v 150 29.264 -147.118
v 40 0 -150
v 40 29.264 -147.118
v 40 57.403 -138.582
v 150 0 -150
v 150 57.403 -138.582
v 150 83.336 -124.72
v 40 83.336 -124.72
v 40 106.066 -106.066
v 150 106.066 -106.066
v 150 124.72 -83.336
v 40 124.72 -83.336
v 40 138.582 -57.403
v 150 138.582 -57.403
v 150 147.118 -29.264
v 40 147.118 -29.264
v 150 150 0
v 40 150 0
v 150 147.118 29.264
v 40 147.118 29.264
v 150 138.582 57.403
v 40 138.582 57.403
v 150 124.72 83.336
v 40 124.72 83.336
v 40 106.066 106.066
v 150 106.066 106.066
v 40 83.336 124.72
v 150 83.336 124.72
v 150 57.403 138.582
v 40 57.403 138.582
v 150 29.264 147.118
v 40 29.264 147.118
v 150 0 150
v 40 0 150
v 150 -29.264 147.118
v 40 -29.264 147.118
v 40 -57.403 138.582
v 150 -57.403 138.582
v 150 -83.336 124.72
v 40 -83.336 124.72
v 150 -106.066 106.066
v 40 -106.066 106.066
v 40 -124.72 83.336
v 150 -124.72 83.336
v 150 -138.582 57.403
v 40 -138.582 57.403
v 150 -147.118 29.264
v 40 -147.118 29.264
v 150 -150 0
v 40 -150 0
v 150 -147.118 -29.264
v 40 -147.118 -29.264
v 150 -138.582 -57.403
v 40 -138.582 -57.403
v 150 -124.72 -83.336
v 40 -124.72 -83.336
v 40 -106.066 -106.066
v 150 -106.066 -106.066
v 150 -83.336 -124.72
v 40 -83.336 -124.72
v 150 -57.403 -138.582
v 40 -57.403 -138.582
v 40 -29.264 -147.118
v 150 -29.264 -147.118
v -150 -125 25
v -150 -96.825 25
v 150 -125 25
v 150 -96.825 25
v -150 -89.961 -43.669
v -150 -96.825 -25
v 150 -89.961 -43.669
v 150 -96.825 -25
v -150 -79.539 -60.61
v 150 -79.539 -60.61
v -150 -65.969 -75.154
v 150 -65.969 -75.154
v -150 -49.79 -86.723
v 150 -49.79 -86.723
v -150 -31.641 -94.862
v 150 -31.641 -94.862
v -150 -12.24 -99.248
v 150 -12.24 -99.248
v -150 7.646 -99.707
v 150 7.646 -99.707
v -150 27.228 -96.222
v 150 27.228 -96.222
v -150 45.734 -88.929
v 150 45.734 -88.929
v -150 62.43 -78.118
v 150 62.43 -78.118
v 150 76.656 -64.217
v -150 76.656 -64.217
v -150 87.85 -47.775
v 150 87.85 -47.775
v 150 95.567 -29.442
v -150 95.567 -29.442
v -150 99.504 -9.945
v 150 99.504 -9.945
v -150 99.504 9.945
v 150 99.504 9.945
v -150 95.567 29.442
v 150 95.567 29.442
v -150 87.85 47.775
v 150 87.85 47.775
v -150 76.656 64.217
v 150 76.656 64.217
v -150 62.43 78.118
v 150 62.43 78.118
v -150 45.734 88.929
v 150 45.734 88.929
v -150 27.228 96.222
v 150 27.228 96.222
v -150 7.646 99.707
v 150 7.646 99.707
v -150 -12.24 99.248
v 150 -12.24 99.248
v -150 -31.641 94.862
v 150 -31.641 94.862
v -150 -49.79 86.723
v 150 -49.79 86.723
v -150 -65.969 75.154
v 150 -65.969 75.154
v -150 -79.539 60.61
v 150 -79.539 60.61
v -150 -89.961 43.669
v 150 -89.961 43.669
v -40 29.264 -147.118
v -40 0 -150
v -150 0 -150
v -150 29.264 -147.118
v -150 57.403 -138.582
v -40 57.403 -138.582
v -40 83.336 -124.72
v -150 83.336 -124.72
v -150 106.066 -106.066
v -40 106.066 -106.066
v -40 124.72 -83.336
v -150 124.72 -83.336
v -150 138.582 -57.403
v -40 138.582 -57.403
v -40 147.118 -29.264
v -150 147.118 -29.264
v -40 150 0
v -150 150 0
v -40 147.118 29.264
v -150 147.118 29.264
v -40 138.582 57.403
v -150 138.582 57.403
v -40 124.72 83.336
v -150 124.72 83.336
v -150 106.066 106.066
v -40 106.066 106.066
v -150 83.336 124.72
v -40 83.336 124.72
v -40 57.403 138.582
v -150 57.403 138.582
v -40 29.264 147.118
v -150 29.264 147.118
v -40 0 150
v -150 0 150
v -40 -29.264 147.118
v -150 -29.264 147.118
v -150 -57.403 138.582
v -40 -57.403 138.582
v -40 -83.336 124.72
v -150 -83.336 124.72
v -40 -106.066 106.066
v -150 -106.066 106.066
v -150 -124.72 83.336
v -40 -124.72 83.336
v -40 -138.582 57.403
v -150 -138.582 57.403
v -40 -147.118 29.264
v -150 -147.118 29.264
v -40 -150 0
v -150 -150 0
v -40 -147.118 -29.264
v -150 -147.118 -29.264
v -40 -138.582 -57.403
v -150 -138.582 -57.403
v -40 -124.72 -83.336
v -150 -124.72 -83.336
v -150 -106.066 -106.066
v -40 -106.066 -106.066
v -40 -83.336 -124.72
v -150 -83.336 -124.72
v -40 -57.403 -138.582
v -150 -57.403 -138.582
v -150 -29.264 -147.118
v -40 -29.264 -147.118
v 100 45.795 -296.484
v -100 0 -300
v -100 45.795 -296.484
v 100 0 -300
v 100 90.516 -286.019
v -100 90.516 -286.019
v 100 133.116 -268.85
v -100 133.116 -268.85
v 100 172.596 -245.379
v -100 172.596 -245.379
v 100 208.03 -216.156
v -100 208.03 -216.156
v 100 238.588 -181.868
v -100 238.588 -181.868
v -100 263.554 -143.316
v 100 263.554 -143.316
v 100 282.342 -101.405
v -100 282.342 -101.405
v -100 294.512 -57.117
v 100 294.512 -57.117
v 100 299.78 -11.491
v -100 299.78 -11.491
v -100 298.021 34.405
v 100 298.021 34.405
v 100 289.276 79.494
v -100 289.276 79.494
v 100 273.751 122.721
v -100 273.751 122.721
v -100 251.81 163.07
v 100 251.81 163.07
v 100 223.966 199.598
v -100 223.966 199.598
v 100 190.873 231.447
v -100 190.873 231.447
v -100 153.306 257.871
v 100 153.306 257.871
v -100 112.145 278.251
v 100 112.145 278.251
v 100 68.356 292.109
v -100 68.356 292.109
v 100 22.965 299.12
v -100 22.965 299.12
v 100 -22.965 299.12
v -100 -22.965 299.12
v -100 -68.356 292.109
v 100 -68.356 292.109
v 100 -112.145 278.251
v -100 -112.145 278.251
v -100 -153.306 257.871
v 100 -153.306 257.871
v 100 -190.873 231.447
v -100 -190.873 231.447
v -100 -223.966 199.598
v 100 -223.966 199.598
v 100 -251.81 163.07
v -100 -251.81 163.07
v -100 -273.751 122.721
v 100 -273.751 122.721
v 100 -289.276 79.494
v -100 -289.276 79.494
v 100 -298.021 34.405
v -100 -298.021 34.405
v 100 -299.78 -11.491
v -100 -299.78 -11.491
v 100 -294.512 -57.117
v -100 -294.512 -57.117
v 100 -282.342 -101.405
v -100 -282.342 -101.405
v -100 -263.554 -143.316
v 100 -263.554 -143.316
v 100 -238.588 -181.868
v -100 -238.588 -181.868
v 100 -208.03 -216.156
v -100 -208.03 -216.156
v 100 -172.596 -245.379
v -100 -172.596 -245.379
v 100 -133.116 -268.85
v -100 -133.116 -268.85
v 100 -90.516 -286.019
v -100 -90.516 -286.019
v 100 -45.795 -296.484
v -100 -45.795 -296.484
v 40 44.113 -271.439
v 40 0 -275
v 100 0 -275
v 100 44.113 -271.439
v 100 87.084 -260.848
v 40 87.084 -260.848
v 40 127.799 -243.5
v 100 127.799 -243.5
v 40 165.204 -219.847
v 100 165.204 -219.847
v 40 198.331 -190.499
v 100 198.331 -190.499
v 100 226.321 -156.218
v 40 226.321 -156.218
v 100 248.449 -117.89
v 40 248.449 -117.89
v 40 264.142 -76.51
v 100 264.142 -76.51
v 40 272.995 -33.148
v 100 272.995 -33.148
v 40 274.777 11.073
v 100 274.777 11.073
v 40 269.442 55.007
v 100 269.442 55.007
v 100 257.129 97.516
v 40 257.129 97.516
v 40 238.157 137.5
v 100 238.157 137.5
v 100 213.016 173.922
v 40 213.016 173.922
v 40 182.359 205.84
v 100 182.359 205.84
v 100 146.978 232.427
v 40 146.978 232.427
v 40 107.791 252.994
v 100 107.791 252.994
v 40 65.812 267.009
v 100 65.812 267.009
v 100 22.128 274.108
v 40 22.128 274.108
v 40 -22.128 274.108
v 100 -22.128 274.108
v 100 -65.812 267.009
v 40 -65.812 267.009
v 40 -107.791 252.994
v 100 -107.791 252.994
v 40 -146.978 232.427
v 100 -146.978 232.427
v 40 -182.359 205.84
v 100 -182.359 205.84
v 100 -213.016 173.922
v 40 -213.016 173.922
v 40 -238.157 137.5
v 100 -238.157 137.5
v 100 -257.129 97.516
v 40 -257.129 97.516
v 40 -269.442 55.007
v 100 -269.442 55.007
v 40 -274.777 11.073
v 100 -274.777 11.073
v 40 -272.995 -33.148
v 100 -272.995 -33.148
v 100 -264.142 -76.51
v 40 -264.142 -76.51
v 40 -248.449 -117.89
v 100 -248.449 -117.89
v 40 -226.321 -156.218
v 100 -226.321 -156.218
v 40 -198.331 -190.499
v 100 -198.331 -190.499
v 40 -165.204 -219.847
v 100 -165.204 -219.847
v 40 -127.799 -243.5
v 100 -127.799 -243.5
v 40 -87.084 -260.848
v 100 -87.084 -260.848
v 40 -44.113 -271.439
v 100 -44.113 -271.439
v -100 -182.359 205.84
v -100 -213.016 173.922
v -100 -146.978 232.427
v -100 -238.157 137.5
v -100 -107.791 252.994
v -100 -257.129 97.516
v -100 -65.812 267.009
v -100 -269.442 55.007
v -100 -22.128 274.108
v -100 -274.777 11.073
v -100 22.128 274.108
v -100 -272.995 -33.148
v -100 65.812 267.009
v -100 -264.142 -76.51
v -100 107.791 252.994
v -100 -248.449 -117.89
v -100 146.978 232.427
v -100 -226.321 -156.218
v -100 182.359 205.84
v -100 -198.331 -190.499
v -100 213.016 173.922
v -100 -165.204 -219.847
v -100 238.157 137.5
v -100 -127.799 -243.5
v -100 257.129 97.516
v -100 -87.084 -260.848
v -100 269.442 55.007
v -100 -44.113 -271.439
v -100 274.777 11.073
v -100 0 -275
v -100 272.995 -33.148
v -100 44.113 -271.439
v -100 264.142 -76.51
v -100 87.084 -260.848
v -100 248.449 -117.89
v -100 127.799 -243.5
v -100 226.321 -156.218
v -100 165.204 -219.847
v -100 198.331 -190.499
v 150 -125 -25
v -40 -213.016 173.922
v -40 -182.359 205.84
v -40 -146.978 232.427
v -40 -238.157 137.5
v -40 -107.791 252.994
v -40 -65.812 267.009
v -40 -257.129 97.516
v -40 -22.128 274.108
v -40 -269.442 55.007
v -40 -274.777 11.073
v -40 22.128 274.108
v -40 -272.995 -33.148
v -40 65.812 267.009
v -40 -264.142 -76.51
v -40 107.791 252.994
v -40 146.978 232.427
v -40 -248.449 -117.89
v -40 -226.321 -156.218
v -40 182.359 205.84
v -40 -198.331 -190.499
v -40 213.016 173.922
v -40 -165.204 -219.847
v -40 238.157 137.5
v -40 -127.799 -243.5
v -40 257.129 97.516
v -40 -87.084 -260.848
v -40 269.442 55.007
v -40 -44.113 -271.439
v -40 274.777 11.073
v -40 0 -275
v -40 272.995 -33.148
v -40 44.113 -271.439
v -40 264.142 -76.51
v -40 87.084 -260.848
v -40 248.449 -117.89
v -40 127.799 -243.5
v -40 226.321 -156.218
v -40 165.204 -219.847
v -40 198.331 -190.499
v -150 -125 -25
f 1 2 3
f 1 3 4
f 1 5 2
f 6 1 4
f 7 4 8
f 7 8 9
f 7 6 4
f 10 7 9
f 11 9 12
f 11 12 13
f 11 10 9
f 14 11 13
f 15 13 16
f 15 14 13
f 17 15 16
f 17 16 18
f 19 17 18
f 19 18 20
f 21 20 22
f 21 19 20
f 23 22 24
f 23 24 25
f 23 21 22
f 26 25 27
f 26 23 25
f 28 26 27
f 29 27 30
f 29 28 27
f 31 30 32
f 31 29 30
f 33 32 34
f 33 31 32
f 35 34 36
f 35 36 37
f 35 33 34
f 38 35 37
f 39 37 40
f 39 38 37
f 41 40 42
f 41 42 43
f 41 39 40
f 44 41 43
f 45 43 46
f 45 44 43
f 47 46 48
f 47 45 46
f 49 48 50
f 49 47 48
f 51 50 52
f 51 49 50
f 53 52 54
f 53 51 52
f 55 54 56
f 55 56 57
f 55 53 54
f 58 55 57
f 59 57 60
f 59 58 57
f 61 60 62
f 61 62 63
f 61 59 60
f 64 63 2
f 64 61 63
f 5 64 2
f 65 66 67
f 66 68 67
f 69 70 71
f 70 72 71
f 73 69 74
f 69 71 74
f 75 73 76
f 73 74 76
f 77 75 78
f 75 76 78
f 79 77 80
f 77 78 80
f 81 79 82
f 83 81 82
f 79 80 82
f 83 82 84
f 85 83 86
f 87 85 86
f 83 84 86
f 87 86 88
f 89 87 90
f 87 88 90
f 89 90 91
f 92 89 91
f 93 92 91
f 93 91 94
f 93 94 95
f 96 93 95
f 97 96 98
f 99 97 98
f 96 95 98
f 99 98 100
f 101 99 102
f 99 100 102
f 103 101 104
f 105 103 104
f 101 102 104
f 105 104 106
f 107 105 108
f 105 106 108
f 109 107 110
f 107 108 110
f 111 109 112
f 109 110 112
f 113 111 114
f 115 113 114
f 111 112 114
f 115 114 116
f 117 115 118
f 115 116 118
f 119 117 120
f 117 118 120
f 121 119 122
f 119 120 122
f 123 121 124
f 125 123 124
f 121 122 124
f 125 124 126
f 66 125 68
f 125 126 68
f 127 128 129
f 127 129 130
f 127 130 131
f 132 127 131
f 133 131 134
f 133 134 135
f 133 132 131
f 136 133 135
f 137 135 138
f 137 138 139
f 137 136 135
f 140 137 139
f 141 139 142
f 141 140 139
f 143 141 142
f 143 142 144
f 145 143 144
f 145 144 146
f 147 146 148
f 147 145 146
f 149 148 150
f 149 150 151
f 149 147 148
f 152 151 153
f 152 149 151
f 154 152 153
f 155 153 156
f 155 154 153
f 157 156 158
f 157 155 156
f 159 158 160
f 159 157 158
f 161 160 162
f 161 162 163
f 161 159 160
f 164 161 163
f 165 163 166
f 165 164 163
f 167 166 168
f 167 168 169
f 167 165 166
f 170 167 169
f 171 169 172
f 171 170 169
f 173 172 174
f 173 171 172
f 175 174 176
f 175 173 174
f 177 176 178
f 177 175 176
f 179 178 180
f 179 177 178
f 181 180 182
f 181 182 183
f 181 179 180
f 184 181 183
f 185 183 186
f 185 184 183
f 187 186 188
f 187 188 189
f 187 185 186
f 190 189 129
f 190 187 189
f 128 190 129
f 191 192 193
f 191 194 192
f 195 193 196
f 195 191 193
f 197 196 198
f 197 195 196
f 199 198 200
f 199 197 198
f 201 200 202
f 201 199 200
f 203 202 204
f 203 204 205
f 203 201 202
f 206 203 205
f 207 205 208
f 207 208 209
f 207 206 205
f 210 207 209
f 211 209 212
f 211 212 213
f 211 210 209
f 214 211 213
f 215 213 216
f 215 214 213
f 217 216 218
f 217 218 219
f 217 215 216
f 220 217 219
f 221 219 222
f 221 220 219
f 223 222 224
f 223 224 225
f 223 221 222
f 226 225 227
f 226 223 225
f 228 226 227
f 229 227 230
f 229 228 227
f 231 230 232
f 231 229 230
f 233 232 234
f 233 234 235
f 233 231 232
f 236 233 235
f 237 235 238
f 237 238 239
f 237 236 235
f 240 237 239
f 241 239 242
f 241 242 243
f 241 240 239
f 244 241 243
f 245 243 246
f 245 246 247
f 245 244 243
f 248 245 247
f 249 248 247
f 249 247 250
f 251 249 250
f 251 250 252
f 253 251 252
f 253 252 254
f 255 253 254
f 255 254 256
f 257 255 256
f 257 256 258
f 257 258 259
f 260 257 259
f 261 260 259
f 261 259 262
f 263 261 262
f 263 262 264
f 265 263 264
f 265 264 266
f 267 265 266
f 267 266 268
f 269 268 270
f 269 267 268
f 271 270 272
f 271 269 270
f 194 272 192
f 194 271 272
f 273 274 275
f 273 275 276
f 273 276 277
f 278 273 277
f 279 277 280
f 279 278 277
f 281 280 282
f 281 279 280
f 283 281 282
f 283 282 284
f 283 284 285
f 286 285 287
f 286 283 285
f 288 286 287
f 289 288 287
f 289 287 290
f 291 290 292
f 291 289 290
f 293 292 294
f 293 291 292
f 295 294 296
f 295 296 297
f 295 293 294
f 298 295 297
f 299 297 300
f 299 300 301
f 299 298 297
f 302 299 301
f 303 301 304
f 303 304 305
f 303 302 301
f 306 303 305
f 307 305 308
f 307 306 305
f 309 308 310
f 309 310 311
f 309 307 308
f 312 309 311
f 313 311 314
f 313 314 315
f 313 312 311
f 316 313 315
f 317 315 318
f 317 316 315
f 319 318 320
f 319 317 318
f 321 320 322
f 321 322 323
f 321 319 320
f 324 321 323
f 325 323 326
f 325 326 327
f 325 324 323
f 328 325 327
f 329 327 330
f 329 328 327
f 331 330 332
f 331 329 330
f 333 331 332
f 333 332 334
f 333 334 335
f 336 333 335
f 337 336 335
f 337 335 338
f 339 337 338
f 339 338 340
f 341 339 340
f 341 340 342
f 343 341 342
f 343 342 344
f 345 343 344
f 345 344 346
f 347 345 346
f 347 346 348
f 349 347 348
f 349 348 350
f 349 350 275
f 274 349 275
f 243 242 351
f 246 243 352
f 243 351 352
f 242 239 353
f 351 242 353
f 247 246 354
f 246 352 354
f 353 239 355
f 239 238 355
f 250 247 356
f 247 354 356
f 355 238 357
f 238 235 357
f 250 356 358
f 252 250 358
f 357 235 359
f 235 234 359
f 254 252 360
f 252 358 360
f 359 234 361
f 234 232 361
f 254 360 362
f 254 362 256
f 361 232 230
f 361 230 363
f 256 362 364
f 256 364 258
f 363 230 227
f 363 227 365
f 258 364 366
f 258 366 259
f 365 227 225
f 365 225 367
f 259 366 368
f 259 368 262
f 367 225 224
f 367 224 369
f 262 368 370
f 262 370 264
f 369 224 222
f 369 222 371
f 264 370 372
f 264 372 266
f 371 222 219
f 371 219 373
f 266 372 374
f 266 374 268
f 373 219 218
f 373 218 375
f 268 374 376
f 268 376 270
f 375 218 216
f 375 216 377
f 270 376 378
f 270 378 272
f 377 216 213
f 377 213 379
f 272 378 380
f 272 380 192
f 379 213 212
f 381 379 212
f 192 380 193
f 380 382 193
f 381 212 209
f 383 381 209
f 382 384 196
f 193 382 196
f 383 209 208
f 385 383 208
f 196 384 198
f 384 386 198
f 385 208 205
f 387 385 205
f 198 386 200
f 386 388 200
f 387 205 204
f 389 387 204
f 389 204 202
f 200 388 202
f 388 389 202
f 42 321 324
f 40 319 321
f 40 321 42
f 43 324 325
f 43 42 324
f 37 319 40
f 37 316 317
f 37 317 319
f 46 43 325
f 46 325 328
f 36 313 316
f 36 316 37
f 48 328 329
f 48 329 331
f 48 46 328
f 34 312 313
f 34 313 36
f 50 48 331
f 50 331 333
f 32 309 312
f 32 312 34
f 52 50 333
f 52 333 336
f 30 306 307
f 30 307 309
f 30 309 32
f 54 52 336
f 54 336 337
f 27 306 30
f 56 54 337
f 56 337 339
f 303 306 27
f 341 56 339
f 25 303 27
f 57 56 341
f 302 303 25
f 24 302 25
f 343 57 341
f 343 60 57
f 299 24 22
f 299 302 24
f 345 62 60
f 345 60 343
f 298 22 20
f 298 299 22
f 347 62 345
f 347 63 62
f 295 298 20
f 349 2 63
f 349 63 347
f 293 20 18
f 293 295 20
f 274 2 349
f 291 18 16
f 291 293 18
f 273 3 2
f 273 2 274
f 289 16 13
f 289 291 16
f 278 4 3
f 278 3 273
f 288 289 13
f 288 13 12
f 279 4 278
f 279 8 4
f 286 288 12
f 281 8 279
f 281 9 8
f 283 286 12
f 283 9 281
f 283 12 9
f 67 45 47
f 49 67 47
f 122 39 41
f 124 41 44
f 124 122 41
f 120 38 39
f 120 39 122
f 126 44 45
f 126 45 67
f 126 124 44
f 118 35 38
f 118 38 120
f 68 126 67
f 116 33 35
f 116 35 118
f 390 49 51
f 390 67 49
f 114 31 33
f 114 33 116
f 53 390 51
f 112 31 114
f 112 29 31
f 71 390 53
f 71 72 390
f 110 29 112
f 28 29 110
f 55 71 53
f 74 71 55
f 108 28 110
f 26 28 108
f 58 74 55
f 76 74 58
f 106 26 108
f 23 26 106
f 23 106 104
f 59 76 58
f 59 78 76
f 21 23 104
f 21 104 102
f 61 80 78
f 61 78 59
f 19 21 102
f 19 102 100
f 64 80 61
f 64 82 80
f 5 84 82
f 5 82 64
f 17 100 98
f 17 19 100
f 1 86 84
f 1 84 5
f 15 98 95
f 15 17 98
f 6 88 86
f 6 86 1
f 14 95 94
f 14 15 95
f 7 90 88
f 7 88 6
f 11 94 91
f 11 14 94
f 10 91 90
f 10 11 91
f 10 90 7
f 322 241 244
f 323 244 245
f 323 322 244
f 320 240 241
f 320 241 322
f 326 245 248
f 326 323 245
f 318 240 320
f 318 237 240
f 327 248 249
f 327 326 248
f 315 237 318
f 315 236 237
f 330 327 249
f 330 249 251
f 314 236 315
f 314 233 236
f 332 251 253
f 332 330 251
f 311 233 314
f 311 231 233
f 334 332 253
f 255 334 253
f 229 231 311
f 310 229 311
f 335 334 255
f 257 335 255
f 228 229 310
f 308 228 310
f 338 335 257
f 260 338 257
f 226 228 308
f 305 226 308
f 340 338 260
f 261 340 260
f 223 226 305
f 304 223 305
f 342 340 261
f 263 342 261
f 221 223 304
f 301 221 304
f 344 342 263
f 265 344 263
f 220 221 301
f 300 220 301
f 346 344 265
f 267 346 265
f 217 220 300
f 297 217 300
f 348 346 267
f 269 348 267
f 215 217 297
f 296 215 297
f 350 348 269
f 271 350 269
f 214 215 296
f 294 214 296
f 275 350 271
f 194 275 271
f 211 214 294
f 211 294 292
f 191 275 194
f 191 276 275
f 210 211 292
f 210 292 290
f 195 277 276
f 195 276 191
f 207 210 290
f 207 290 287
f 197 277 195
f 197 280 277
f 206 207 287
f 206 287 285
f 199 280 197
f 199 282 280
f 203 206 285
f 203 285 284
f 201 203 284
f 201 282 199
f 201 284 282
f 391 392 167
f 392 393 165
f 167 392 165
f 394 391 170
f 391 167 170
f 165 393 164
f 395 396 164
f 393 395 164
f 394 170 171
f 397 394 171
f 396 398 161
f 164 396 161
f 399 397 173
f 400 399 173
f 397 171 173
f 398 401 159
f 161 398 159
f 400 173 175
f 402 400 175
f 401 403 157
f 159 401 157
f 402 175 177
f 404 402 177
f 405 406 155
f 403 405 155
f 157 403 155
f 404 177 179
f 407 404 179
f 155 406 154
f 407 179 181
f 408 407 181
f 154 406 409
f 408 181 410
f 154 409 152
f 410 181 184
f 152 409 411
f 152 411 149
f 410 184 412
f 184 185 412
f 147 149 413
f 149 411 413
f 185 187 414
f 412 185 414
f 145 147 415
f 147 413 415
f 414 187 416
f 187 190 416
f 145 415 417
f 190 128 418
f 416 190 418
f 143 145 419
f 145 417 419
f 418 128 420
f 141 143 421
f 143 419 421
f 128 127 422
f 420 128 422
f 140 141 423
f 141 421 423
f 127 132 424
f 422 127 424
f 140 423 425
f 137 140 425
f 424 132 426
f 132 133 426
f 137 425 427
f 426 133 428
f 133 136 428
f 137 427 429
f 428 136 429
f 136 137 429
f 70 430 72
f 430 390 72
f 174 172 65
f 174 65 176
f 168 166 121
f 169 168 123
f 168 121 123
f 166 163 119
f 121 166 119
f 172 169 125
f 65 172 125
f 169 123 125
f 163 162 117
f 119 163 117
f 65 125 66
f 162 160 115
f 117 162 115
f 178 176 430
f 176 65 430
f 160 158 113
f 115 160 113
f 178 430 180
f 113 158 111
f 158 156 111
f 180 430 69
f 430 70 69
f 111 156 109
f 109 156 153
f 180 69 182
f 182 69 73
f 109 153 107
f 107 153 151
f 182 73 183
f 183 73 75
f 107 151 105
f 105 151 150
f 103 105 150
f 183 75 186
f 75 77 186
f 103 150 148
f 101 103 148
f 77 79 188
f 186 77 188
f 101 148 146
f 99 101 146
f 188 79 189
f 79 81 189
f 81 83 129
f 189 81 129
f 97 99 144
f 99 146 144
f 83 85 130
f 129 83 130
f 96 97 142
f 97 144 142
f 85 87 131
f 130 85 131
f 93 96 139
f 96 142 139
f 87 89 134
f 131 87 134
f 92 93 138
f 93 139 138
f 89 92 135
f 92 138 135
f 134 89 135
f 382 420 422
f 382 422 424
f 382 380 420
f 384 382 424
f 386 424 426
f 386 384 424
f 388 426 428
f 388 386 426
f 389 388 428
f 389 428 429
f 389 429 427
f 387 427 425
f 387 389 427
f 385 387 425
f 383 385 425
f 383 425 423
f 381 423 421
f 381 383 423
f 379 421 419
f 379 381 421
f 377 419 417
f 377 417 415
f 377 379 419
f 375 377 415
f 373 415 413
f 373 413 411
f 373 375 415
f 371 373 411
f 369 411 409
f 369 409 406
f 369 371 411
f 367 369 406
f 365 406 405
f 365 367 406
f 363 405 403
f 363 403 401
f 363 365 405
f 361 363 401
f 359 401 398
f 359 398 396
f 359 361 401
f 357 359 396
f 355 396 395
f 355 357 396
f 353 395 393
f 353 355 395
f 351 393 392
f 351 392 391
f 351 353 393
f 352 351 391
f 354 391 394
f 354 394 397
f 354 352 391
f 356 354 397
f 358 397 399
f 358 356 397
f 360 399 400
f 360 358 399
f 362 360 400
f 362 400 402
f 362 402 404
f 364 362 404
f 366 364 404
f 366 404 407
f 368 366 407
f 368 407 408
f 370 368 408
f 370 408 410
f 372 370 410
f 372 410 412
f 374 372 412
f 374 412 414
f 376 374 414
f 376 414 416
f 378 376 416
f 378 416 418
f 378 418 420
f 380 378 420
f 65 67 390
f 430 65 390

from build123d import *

# Parameters (mm, degrees)
IZIM1_R                     = 150
Y_KSEKLIK_EKSTR_ZYON1_DEPTH = 150
IZIM2_R                     = 300
IZIM2_R_2                   = 275
Y_KSEKLIK_EKSTR_ZYON2_DEPTH = 100
IZIM3_R                     = 275
IZIM3_R_2                   = 150
Y_KSEKLIK_EKSTR_ZYON3_DEPTH = 40


with BuildPart() as part:
    # Çizim1 → Yükseklik-Ekstrüzyon1 (new, symmetric)
    with BuildSketch(Plane(origin=(0, 0, 0), x_dir=(0, 0, -1), z_dir=(1, 0, 0))):
        Circle(IZIM1_R)
        with BuildLine():
            Line((-25, -125), (25, -125))
            Line((25, -125), (25, -96.824583655))
            ThreePointArc((25, -96.824583655), (0, 100), (-25, -96.824583655))
            Line((-25, -96.824583655), (-25, -125))
        make_face(mode=Mode.SUBTRACT)
    extrude(amount=Y_KSEKLIK_EKSTR_ZYON1_DEPTH, both=True)



with BuildPart() as body_2:
    # Çizim2 → Yükseklik-Ekstrüzyon2 (new, symmetric)
    with BuildSketch(Plane(origin=(0, 0, 0), x_dir=(0, 0, -1), z_dir=(1, 0, 0))):
        Circle(IZIM2_R)
        Circle(IZIM2_R_2, mode=Mode.SUBTRACT)
    extrude(amount=Y_KSEKLIK_EKSTR_ZYON2_DEPTH, both=True)


with BuildPart() as part_1:
    add(part.part)

    add(body_2.part)  # Yükseklik-Ekstrüzyon3 merges body 2
    # Çizim3 → Yükseklik-Ekstrüzyon3 (add, symmetric)
    with BuildSketch(Plane(origin=(0, 0, 0), x_dir=(0, 0, -1), z_dir=(1, 0, 0))):
        Circle(IZIM3_R)
        Circle(IZIM3_R_2, mode=Mode.SUBTRACT)
    extrude(amount=Y_KSEKLIK_EKSTR_ZYON3_DEPTH, both=True)


solid = part_1.part
